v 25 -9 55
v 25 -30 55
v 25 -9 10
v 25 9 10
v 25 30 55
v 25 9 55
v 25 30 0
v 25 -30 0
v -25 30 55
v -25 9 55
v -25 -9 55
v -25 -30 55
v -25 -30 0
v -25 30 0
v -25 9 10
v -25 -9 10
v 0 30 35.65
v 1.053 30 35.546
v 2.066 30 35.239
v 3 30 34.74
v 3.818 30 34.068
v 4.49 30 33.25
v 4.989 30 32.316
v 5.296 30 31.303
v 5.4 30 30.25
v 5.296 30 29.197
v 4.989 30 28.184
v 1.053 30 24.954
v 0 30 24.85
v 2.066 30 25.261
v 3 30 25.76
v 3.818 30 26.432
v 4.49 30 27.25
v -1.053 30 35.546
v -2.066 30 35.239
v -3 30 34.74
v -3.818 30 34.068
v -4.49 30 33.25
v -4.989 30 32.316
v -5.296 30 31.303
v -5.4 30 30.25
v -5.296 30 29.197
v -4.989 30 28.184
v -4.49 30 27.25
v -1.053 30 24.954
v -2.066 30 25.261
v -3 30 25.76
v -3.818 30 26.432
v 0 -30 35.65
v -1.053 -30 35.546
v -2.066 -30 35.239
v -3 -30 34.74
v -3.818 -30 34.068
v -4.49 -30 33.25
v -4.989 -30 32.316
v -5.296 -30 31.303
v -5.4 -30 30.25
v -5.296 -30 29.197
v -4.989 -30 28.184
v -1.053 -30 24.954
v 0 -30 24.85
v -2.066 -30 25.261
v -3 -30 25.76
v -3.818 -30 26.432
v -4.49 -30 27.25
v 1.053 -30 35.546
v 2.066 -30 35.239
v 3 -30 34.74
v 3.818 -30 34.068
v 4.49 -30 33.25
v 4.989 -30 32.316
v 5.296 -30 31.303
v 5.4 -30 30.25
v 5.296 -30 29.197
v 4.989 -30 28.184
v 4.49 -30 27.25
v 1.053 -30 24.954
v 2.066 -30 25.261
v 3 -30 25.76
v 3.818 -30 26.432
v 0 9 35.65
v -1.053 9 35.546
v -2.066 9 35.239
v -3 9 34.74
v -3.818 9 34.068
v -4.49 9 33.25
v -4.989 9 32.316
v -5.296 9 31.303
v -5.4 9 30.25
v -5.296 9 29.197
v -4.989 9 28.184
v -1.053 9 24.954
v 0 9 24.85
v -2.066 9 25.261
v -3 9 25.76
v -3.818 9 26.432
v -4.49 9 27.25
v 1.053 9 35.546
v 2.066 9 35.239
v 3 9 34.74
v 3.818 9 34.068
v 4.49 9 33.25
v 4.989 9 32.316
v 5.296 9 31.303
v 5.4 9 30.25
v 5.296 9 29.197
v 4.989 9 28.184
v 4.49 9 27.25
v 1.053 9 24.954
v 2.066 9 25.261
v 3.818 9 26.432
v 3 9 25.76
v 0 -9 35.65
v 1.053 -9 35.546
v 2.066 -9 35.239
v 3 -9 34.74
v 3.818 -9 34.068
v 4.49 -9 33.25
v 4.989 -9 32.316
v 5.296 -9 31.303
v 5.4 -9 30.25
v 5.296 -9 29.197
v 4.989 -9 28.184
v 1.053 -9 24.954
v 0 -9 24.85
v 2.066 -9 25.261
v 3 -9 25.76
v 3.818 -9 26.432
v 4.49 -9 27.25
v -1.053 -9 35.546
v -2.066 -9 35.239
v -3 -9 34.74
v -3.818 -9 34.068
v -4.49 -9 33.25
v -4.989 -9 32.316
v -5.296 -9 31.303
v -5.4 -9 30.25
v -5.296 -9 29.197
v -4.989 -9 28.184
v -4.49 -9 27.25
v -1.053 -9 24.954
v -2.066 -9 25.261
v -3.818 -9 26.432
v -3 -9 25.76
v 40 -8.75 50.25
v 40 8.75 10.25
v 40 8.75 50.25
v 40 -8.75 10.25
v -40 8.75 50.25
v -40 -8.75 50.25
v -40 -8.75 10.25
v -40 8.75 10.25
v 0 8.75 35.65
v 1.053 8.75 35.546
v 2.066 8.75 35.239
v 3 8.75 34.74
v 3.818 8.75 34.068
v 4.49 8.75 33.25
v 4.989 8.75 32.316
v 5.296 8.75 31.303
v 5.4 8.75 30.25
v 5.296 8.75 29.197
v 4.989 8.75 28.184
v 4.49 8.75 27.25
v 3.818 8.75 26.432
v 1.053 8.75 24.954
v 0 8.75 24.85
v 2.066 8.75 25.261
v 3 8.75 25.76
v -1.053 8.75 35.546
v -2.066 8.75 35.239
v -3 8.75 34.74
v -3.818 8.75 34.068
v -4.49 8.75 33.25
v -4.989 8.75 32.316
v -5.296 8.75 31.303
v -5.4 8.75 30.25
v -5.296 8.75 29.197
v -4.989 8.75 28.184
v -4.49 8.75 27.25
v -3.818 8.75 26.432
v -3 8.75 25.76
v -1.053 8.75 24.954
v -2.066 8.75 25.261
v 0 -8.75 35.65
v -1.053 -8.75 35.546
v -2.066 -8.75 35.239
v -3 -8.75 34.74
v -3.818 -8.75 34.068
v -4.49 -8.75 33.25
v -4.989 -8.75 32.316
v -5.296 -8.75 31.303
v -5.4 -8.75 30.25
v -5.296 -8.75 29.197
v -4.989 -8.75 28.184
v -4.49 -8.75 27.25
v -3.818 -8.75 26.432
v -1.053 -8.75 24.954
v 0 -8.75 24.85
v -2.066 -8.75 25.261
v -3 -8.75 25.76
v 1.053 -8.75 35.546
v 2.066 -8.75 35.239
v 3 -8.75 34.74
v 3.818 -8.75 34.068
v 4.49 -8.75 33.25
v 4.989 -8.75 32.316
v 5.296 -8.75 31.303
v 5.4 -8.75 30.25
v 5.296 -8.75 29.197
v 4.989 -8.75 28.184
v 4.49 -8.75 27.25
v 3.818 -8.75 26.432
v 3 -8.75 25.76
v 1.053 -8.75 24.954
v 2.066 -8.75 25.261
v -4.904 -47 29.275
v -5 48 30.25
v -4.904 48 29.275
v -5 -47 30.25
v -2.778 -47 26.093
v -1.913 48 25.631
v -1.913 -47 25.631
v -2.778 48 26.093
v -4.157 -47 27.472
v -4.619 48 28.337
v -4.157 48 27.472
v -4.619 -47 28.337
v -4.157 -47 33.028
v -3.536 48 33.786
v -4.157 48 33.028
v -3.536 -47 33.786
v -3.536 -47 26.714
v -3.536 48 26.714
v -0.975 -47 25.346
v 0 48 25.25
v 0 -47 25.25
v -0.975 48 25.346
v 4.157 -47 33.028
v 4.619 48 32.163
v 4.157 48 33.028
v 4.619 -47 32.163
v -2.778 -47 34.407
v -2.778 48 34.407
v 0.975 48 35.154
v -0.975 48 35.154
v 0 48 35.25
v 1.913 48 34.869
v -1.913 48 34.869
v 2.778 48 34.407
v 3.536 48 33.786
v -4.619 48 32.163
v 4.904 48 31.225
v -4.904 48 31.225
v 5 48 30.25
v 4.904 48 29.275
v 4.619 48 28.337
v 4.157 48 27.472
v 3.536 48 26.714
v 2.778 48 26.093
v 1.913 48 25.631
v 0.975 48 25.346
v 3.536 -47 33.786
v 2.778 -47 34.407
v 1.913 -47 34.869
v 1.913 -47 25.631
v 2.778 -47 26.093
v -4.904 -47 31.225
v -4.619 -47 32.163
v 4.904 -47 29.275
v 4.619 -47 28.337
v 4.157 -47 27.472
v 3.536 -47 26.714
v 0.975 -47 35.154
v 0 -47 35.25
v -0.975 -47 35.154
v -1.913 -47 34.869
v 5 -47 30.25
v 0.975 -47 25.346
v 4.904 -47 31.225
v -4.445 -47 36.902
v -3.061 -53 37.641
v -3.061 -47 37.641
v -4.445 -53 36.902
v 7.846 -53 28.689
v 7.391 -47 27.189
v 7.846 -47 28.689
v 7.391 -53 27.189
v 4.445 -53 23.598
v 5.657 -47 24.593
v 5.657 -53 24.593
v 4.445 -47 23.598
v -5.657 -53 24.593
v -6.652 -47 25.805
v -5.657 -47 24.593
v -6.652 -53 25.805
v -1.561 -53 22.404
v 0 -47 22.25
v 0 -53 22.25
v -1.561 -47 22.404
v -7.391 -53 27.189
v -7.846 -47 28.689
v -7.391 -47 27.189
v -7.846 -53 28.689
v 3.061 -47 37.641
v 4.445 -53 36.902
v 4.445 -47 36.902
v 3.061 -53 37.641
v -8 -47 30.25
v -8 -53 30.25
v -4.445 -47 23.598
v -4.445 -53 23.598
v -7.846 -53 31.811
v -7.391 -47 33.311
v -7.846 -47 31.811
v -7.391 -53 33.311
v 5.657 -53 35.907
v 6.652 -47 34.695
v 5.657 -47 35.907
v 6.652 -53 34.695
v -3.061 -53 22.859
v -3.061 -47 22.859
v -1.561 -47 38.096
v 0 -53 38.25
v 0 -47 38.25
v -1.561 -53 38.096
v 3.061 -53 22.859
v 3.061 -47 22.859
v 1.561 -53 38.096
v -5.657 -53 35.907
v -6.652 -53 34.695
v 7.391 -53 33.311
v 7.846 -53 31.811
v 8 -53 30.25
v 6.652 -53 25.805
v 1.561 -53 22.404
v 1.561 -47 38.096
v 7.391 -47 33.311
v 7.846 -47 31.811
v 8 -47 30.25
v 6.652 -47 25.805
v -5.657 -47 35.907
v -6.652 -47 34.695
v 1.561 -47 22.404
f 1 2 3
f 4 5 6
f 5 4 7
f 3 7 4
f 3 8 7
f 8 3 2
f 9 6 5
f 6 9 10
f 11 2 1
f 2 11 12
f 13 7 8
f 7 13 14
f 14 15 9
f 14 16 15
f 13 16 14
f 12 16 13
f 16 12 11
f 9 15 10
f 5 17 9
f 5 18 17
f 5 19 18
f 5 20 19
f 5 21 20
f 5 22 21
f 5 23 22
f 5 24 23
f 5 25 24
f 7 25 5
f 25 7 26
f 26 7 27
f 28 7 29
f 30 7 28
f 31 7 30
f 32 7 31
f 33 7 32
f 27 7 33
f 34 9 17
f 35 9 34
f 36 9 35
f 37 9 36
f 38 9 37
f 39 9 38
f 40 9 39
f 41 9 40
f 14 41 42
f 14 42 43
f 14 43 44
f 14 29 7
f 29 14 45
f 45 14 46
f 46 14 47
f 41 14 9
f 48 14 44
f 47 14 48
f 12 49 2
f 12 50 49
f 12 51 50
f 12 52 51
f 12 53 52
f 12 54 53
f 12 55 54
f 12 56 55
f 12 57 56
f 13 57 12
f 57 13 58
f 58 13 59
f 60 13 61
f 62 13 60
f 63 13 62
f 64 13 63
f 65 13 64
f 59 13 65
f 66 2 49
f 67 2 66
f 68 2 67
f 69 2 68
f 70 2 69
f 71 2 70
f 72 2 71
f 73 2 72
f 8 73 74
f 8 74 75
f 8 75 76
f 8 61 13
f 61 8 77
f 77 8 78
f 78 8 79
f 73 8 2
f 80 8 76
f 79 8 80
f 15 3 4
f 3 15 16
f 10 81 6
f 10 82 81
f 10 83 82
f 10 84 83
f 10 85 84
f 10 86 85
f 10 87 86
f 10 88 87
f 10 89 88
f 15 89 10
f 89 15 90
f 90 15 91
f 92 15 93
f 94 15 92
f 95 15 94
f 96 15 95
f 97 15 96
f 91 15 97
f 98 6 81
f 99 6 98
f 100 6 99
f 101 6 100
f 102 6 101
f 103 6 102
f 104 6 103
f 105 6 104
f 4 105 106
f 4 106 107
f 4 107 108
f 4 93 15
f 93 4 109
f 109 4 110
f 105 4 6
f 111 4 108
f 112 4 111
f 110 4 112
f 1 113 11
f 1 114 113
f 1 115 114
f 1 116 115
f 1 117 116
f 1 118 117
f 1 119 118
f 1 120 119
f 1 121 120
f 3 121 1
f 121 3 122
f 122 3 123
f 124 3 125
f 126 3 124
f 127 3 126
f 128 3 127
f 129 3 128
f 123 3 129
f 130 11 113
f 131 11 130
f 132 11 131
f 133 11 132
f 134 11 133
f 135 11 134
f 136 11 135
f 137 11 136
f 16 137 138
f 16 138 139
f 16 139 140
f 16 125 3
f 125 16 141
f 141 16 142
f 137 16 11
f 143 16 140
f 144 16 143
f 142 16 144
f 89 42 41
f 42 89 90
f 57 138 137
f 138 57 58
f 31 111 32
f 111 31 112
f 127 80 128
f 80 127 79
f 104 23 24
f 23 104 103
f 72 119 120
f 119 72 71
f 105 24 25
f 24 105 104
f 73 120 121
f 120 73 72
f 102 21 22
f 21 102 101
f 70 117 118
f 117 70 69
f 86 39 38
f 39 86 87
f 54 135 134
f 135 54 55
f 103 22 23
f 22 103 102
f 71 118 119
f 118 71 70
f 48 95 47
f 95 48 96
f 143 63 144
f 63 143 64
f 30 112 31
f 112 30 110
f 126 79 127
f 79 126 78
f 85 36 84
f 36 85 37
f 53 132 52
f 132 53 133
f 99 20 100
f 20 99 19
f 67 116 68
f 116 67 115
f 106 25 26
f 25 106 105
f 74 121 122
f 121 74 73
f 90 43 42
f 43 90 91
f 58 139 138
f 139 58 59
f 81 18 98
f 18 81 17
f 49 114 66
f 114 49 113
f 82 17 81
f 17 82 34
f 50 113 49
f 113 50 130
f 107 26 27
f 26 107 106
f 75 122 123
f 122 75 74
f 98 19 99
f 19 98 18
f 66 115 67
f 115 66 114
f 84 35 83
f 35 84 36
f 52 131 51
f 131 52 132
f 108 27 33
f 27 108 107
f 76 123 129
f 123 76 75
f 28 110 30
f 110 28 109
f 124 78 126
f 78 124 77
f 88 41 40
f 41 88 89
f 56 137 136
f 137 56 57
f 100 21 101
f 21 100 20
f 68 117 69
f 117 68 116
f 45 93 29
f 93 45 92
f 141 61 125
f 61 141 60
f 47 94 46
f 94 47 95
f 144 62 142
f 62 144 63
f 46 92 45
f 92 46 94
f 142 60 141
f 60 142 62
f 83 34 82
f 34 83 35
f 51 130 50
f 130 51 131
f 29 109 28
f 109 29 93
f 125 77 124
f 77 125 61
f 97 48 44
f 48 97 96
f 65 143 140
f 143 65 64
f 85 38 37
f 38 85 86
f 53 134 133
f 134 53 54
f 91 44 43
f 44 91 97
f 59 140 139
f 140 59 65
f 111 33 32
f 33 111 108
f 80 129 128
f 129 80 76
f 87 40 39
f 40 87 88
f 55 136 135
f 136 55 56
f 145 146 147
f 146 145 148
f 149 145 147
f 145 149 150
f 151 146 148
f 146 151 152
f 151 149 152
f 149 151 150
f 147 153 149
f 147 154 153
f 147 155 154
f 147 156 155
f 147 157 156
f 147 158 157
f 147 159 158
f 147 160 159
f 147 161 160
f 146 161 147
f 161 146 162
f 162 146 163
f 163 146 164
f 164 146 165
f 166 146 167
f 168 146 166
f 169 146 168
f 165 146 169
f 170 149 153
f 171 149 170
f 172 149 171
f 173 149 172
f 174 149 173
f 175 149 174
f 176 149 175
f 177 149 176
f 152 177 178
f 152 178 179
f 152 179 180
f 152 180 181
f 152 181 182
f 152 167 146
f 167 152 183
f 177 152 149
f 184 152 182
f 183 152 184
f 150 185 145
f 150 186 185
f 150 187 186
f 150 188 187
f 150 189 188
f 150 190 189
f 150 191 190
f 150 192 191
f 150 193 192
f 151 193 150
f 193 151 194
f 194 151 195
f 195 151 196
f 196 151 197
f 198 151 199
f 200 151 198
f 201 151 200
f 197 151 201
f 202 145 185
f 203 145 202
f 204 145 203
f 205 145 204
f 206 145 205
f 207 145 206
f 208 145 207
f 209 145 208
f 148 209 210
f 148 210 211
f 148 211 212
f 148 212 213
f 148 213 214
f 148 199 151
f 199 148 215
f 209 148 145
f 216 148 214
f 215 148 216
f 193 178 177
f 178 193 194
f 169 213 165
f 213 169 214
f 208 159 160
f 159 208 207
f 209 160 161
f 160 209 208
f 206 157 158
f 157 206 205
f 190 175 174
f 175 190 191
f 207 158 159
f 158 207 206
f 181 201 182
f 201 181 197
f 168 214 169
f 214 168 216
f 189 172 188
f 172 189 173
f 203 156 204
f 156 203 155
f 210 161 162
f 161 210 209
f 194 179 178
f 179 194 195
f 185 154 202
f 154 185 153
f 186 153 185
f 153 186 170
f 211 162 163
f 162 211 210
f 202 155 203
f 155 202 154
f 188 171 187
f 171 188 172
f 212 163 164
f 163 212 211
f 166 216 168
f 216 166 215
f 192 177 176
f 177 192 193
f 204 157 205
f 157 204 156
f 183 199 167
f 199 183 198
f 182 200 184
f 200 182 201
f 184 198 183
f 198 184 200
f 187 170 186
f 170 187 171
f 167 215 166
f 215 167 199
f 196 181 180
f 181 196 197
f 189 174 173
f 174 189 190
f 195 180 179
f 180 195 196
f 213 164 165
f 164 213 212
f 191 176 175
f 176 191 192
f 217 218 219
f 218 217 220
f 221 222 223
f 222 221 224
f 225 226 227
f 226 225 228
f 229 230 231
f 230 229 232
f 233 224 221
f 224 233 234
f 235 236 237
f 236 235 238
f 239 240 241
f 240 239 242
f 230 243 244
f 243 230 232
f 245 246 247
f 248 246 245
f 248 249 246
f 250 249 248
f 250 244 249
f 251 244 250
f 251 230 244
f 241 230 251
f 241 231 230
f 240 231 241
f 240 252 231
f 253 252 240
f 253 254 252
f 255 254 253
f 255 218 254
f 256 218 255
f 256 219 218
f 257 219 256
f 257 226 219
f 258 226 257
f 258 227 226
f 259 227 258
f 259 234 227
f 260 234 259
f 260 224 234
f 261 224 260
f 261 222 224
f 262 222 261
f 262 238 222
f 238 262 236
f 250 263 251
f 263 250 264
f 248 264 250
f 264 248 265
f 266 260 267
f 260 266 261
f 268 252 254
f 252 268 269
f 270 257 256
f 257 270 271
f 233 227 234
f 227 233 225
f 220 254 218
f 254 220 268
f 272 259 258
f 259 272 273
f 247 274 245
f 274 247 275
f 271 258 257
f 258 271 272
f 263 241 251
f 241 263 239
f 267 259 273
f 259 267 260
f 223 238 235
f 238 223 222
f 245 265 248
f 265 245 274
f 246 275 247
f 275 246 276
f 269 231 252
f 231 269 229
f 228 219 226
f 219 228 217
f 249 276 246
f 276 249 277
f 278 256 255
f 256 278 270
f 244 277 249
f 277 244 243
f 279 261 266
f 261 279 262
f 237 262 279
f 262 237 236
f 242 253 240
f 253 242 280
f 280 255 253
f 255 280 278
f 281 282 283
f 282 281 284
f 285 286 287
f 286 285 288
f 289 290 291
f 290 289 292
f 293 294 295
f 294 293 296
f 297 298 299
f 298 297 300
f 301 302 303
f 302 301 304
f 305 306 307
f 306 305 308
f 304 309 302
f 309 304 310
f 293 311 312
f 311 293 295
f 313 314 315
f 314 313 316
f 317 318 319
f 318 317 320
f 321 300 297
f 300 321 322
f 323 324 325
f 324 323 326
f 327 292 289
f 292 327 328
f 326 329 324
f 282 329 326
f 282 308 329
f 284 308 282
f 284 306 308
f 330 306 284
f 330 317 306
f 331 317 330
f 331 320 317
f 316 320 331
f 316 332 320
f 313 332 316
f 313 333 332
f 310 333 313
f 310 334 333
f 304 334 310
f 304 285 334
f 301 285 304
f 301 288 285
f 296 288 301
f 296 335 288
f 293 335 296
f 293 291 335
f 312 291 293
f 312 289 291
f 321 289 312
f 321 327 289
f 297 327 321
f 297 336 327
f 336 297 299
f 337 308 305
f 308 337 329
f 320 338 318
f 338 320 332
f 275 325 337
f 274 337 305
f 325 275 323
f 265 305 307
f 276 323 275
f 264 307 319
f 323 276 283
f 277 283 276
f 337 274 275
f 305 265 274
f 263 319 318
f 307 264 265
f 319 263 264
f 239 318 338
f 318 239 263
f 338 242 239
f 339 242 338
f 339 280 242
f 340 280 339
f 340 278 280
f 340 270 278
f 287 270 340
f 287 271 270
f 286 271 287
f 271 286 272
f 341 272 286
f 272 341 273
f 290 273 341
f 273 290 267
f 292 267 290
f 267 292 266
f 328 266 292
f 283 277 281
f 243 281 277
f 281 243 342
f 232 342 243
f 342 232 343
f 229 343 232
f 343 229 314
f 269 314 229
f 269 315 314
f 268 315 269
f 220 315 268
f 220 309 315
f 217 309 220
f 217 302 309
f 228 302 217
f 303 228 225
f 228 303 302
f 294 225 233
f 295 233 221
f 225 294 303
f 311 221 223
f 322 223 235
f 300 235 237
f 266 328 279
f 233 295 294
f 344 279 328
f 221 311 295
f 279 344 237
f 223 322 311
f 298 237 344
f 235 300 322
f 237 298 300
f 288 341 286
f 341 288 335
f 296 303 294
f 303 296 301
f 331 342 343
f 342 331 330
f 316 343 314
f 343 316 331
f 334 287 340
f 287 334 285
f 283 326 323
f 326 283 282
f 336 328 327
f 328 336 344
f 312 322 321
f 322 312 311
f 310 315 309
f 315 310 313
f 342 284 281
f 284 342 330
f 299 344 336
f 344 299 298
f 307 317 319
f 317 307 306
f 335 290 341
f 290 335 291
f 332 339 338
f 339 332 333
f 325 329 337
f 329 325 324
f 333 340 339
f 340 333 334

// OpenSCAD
$fn = 32;

// ------------------------------------------------------------------------
// Clevis joint: 50 mm clevis, pin d10
// Every part is its own module, assembly() places them once.
// ------------------------------------------------------------------------

// --- part 1 ---
module clevis() {
  difference() {
    translate([-25, -30, 0]) cube([50, 60, 55]);
    translate([-26, -9, 10]) cube([52, 18, 46]);
    translate([0, 0, 30.25]) rotate([90, 0, 0]) cylinder(h = 62, d = 10.8, center = true);
  }
}

// --- part 2 ---
module eye() {
  difference() {
    translate([-40, -8.75, 0]) cube([80, 17.5, 40]);
    translate([0, 0, 20]) rotate([90, 0, 0]) cylinder(h = 19.5, d = 10.8, center = true);
  }
}

// --- part 3 ---
module pin() {
  rotate([0, 90, 0]) cylinder(h = 96, d = 10, center = true);
  translate([-53, 0, 0]) rotate([0, 90, 0]) cylinder(h = 6, d = 16);
}

// --- assembly ---
module assembly() {
  translate([0, 0, 0]) rotate([0, 0, 0]) clevis();
  translate([0, 0, 10.25]) rotate([0, 0, 0]) eye();
  translate([0, 0, 30.25]) rotate([0, 0, 90]) pin();
}

assembly();
